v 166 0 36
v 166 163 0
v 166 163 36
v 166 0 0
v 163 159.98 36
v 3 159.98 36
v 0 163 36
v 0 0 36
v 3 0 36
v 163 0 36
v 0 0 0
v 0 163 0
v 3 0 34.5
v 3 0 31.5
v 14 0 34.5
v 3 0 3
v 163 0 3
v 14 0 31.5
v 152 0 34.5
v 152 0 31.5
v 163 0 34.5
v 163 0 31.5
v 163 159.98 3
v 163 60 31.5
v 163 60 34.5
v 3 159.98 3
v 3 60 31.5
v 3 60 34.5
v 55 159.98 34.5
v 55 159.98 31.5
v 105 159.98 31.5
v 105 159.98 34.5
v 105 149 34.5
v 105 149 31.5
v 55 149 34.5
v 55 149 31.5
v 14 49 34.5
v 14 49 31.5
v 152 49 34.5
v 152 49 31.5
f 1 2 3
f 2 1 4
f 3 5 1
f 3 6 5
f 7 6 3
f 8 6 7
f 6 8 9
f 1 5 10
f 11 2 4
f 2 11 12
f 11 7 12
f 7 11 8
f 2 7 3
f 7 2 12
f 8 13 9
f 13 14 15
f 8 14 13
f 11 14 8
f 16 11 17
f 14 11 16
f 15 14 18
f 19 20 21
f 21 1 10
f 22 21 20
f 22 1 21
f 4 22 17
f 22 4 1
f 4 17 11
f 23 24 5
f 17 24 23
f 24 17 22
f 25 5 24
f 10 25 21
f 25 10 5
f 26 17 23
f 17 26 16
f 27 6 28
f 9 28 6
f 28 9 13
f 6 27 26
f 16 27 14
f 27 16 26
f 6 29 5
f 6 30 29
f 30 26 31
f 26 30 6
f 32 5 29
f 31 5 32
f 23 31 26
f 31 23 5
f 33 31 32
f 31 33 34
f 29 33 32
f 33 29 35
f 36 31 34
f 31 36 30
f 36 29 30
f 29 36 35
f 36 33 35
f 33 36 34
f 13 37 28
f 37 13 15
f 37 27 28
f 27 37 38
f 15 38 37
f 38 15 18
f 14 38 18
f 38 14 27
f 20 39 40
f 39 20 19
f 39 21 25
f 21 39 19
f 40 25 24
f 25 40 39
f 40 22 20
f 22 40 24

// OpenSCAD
// Use partname to control which object is being rendered:
//
// _partname_values shelf
partname = "display";

// how thick we need to cut out for tape; should be less than actual tape
// thickness (to ensure adhesion):
double_adhesive_tape_thickness_cutout = 1.5;

cable_box_wdh = [160,160,30];
wall_thickness = 3;
adhesive_thickness = 1.5;

// $fa is the minimum angle for a fragment. Minimum value is 0.01.
$fa = 12;
// $fs is the minimum size of a fragment. If high, causes
// fewer-than-$fa-would-indicate surfaces. Minimum is 0.01.
$fs = 2;

module shelf()
{
  difference()
  {
    cube([
      cable_box_wdh[0]+2*wall_thickness,
      cable_box_wdh[1]+1*wall_thickness,
      cable_box_wdh[2]+2*wall_thickness]);
    translate([wall_thickness,-0.02,wall_thickness])
      cube([
        cable_box_wdh[0],
        cable_box_wdh[1],
        cable_box_wdh[2]+2*wall_thickness]);
  }

  module adhesive_strip()
  {
    linear_extrude(height=wall_thickness)
    {
      polygon([
        [0, 0],
        [11, 0],
        [11, 60-11],
        [0, 60],
      ]);
    }
  }
  translate([0,0,cable_box_wdh[2]+wall_thickness-adhesive_thickness])
  {
    translate([cable_box_wdh[0]/2-50/2,cable_box_wdh[1]-11,0])
    {
      cube([50,11,wall_thickness]);
    }
    translate([wall_thickness,0,0])
    {
      adhesive_strip();
    }
    translate([cable_box_wdh[0]+wall_thickness,0,0])
    {
      mirror([1,0,0])
      {
        adhesive_strip();
      }
    }
  }

  /*
  intersection()
  {
    cube([cable_box_wdh[0]+cable_box_wdh[2],cable_box_wdh[1]+cable_box_wdh[2],cable_box_wdh[2]+2*wall_thickness]);
    translate([cable_box_wdh[2]+2*wall_thickness,cable_box_wdh[2]+2*wall_thickness,0])
    {
      minkowski()
      {
        // using the sphere entirely to dimension minkowski size:
        sphere(r=cable_box_wdh[2]+2*wall_thickness);
        cube([cable_box_wdh[0],cable_box_wdh[1],0.01]);
      }
    }
  }
  */
}


// Conventions:
// * When an object is rendered using partname, position/rotate it according to
//   printing suggestion, here. (The module itself will be positioned/rotated
//   like it will be, in the put-together "display" situation.)
// * The special value "display" for partname is the product picture for all
//   parts put together.
if ("display" == partname)
{
  shelf();
} else if ("shelf" == partname)
{
  rotate([0,0,0])
  {
    shelf();
  }
}
